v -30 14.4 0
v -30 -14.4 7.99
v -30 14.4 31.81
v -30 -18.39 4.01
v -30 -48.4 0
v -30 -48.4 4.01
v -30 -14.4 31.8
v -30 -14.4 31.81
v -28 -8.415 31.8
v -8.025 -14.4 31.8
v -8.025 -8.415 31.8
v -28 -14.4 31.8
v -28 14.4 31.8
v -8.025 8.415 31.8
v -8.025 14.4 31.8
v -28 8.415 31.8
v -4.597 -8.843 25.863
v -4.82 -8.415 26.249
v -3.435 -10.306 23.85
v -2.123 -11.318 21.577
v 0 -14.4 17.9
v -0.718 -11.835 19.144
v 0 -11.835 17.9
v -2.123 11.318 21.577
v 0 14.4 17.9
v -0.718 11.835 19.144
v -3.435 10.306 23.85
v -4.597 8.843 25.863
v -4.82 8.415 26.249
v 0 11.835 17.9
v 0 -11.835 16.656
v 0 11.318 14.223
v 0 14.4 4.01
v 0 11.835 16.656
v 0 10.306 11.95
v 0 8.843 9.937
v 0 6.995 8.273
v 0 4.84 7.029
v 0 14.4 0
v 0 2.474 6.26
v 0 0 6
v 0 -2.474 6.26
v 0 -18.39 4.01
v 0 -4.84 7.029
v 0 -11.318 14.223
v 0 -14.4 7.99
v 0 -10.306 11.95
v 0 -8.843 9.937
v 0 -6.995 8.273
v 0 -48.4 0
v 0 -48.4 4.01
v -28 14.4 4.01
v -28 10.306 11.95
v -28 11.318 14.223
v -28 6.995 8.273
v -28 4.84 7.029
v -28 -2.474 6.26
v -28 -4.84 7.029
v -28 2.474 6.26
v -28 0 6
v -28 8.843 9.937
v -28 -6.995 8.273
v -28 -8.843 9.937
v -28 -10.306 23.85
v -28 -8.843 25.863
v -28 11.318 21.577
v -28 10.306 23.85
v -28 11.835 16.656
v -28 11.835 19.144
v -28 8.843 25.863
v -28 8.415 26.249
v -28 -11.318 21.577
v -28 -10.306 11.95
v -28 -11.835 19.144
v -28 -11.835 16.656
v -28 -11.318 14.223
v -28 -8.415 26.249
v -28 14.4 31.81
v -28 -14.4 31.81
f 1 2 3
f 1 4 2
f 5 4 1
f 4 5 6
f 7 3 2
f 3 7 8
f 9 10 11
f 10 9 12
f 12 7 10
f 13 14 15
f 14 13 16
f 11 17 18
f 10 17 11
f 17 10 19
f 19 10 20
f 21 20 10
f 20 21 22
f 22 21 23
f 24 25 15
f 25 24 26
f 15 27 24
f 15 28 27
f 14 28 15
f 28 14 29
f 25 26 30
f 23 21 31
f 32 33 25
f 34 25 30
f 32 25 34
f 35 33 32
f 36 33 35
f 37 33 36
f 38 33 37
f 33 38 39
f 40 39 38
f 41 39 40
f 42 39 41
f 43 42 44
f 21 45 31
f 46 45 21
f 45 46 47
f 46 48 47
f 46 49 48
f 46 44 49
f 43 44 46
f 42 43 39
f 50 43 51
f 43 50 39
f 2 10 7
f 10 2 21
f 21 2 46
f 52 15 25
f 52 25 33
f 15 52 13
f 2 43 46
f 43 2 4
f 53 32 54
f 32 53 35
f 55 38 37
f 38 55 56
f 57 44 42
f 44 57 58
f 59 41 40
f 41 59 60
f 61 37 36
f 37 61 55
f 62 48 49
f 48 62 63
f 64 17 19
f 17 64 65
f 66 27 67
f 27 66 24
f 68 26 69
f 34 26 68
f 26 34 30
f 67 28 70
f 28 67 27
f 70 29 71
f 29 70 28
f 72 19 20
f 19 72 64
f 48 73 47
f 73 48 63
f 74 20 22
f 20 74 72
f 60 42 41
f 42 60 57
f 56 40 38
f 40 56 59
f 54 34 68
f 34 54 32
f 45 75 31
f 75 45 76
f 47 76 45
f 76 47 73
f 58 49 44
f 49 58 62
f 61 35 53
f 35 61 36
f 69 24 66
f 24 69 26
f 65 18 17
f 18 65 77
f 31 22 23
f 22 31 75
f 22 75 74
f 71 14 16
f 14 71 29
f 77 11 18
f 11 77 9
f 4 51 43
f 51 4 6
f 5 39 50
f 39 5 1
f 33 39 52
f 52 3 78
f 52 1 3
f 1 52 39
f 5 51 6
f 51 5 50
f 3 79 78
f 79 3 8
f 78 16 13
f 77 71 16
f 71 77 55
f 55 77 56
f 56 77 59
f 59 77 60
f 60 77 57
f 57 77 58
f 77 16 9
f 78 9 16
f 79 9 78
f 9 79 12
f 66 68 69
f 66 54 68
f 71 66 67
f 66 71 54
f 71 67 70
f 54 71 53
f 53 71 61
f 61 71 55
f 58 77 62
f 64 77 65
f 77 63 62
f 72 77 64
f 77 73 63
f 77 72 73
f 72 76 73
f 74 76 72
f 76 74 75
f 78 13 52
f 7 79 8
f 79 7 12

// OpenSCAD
baseThickness = 4;
length = 60;
kerf = 1.6;
tubingDiameter = 23.5;
clampingWidth = 30;
minWall = 2.5;
tubingTolerance = 0.15;
kerfTolerance = 0.1;
endAngle = 30;
stopWall = 2;
cornerSize = 4;
extraCutHeight = 2;
part = 2; // [0:miter,1:right end stop,2:left end stop]

module end_of_parameters_dummy() {}


//BEGIN: use <tubemesh.scad>;

//BEGIN: use <eval.scad>;
function _isString(v) = v >= "";
function _isVector(v) = !(v>="") && len(v) != undef;
function _isFloat(v) = v+0 != undef;

function _substr(s, start=0, stop=undef, soFar = "") =
    start >= (stop==undef ? len(s) : stop) ? soFar :
        _substr(s, start=start+1, stop=stop, soFar=str(soFar, s[start]));

function _parseInt(s, start=0, stop=undef, accumulated=0) =
    let( stop = stop==undef ? len(s) : stop )
        start >= stop ? accumulated :
        s[start] == "+" ? _parseInt(s, start=start+1, stop=stop) :
        s[start] == "-" ? -_parseInt(s, start=start+1, stop=stop) :
        let (digit = search(s[start], "0123456789"))
            digit == [] ? 0 : _parseInt(s, start=start+1, stop=stop, accumulated=accumulated*10+digit[0]);

function _findNonDigit(s, start=0) =
    start >= len(s) || s[start]<"0" || s[start]>"9" ? start :
    _findNonDigit(s, start=start+1);

function _replaceChar(s,c1,c2,pos=0,soFar="") =
    pos >= len(s) ? soFar :
    _replaceChar(s,c1,c2,pos=pos+1,soFar=str(soFar, s[pos]==c1 ? c2 : s[pos]));

function _parseUnsignedFloat(s) =
    len(s) == 0 ? 0 :
        let(
            firstNonDigit = _findNonDigit(s),
            decimalPart = s[firstNonDigit]!="." ?
                [firstNonDigit,firstNonDigit] : [firstNonDigit+1, _findNonDigit(s, start=firstNonDigit+1)],
            intPart = _parseInt(s,start=0,stop=firstNonDigit),
            fractionPart = _parseInt(s,start=decimalPart[0],stop=decimalPart[1]),
            baseExp = s[decimalPart[1]]=="e" || s[decimalPart[1]]=="E" ? pow(10,_parseInt(s, start=decimalPart[1]+1)) : 1)
            (intPart+fractionPart*pow(10,-(decimalPart[1]-decimalPart[0])))*baseExp;

function _tail(v) = len(v)>=2 ? [for(i=[1:len(v)-1]) v[i]] : [];
function _isspace(c) = (" " == c || "\t" == c || "\r" == c || "\n" == c );
function _isdigit(c) = ("0" <= c && c <= "9" );
function _isalpha(c) = ("a" <= c && c <= "z") || ("A" <= c && c <= "Z");
function _isalpha_(c) = _isalpha(c)  || c=="_";
function _isalnum_(c) = _isalpha(c) || _isdigit(c) || c=="_";
function _flattenLists(ll) = [for(a=ll) for(b=a) b];

function _spaceSequence(s, start=0, count=0) =
    len(s)>start && _isspace(s[start]) ? _spaceSequence(s, start=start+1, count=count+1) : count;
function _digitSequence(s, start=0, count=0) =
    len(s)>start && _isdigit(s[start]) ? _digitSequence(s, start=start+1,count=count+1) : count;
function _alnum_Sequence(s, start=0, count=0) =
    len(s)>start && _isalnum_(s[start]) ? _alnum_Sequence(s, start=start+1,count=count+1) : count;
function _identifierSequence(s, start=0, count=0) =
    len(s)>start && _isalpha_(s[start]) ? _alnum_Sequence(s, start=start+1, count=count+1) : count;
function _signedDigitSequence(s, start=0) =
    len(s) <= start ? 0 :
        (s[start] == "+" || s[start] == "-" ) ? 1+_digitSequence(s,start=start+1) : _digitSequence(s,start=start);
function _realStartingWithDecimal(s, start=0) =
    len(s)>start && s[start] == "." ?
        let(next = start+1+_digitSequence(s, start=start+1))
        (s[next] == "e" || s[next] == "E" ?
            next-start+1+_signedDigitSequence(s, start=next+1) : next-start)
        : 0;
function _realContinuation(s, start=0) =
    len(s) <= start ? 0 :
        let(c1=_realStartingWithDecimal(s, start=start))
        c1 > 0 ? c1 :
        s[start] == "e" || s[start] == "E" ?
            1+_signedDigitSequence(s, start=start+1) : 0;
function _positiveRealSequence(s, start=0) =
    len(s) <= start ? 0 :
        let(c1 = _realStartingWithDecimal(s, start=start))
            c1 > 0 ? c1 :
        let(c2 = _digitSequence(s, start=start))
            c2 > 0 ? c2 + _realContinuation(s, start=start+c2) : 0;

_multiSymbolOperators = [ "<=", ">=", "==", "&&", "||" ]; // must be in order of decreasing length

function _multiSymbolOperatorSequence(s, start=0) =
    (s[start]=="<" && s[start+1]=="=") ||
    (s[start]==">" && s[start+1]=="=") ||
    (s[start]=="=" && s[start+1]=="=") ||
    (s[start]=="!" && s[start+1]=="=") ||
    (s[start]=="&" && s[start+1]=="&") ||
    (s[start]=="|" && s[start+1]=="|") ? 2 : 0;

function _tokenize(s, start=0) =
    start >= len(s) ? [] :
    let(c1=_spaceSequence(s, start=start)) c1>0 ?
        concat([" "], _tokenize(s, start=start+c1)) :
    let(c2=_identifierSequence(s, start=start)) c2>0 ?
        concat([_substr(s, start=start, stop=start+c2)], _tokenize(s, start=start+c2)) :
    let(c3=_positiveRealSequence(s, start=start)) c3>0 ?
        concat([_substr(s, start=start, stop=start+c3)], _tokenize(s, start=start+c3)) :
    let(c4=_multiSymbolOperatorSequence(s, start=start)) c4>0 ?
        concat([_substr(s, start=start, stop=start+c4)], _tokenize(s, start=start+c4)) :
        concat([s[start]], _tokenize(s, start=start+1));


function _endParens(list,start=0,openCount=0,stop=undef) =
    let(stop = stop==undef ? len(list) : stop)
    start >= stop ? (openCount?undef:stop) :
    list[start][0] == ")" ?
            (openCount==1 ? start+1 : _endParens(list,start+1,stop=stop, openCount=openCount-1)) :
    _endParens(list,start+1,stop=stop, openCount=
        list[start][0] == "(" ?
            openCount+1 : openCount);

function _indexInTable(string, table, column=0) =
    let (s=search([string], table, index_col_num=column))
        s[0] == [] ? -1 : s[0][0];

_NAME = 0;
_ARITY = 1;
_PREC = 2;
_ASSOC_DIR = 3;
_ARGUMENTS_FROM_VECTOR = 4;
_OPERATOR = 5;
_EXTRA_DATA = 6;

function _func(op) = [ op, 1, -1, 1, true, op ];

_operators = [
    [ "[", 1, -1, 1, true, "[" ],
    [ "pow", 1, -1, 1, true, "^" ],
    [ "cross", 1, -1, 1, true, "cross" ],
    _func("sqrt"),
    _func("cos"),
    _func("sin"),
    _func("tan"),
    _func("acos"),
    _func("asin"),
    _func("atan"),
    _func("COS"),
    _func("SIN"),
    _func("TAN"),
    _func("ACOS"),
    _func("ASIN"),
    _func("ATAN"),
    _func("abs"),
    _func("ceil"),
    _func("exp"),
    _func("floor"),
    _func("ln"),
    _func("log"),
    _func("round"),
    _func("sign"),
    _func("norm"),
    [ "atan2", 1, -1, 1, true, "atan2" ],
    [ "ATAN2", 1, -1, 1, true, "ATAN2" ],
    [ "max", 1, -1, 1, true, "max" ],
    [ "min", 1, -1, 1, true, "min" ],
    [ "concat", 1, -1, 1, true, "concat" ],
    [ "#", 2, 0, -1, false, "#" ],
    [ "^", 2, 0, -1, false, "^" ],
    [ "#-",1, 0.5, 0, true, "-" ],
    [ "#+",1, 0.5, 0, true, "+" ],
    [ "*", 2, 1, 1, false, "*" ],
    [ "/", 2, 1, 1, false, "/" ],
    [ "%", 2, 1, 1, false, "%" ],
    [ "+", 2, 2, 1, true, "+" ],
    [ "-", 2, 2, 1, true, "-" ],
    [ "!=", 2, 3, 1, true, "!=" ],
    [ "==", 2, 3, 1, true, "==" ],
    [ "<=", 2, 3, 1, true, "<=" ],
    [ ">=", 2, 3, 1, true, ">=" ],
    [ "<", 2, 3, 1, true, "<" ],
    [ ">", 2, 3, 1, true, ">" ],
    [ "!", 1, 4, 1, true, "!" ],
    [ "&&", 2, 5, 1, true, "&&" ],
    [ "||", 2, 5, 1, true, "||" ],
    [ "?", 2, 10, -1, true, "?" ],
    [ ":", 2, 10, -1, true, ":" ],
    [ "=", 2, 30, 1, true, "=" ], // for let()
    [ "let", 1, 25, 1, true, "let" ],
    [ ",", 2, 100, 1, true, "," ]
   ];

_binary_or_unary = [ ["-", "#-"], ["+", "#+"], ["#", "["] ];

// insert parentheses in some places to tweak the order of
// operations in those contexts
function _fixBrackets(pretok,start=0) =
    start >= len(pretok) ? [] :
    pretok[start] == "[" ?
        concat(["#", "("], _fixBrackets(pretok,start=start+1)) :
    pretok[start] == "]" ?
        concat([")"], _fixBrackets(pretok,start=start+1)) :
    pretok[start] == "?" ?
        concat([pretok[start],"("], _fixBrackets(pretok,start=start+1)) :
    pretok[start] == ":" ?
        concat([")",pretok[start]], _fixBrackets(pretok,start=start+1)) :
        concat(pretok[start], _fixBrackets(pretok,start=start+1));

// disambiguate operators that can be unary or binary
function _fixUnaries(pretok) =
    [ for (i=[0:len(pretok)-1])
         let (
            a = pretok[i],
            j=_indexInTable(a, _binary_or_unary))
            (0 <= j && (i == 0 || pretok[i-1] == "(" ||
                0 <= _indexInTable(pretok[i-1], _operators)))? _binary_or_unary[j][1] : a ];

function _fixLet1(tok, start=0, stop=undef) =
    let (stop = stop==undef ? len(tok) : stop)
        start >= stop ? [] :
        tok[start][0] == "let"?
           let(endP=_endParens(tok,start=start+1,stop=stop,openCount=0)) concat([concat(tok[start], [_fixLet1(tok,start=start+2,stop=endP-1)])], _fixLet1(tok,start=endP,stop=stop)) :
        concat([tok[start]], _fixLet1(tok,start=start+1,stop=stop));

function _parsePass1(s) =
    let (pretok=_fixUnaries(_fixBrackets(_tokenize(s))))
    _fixLet1(
    [ for (i=[0:len(pretok)-1])
        let (a=pretok[i])
        if (a[0] != " ")
            let (j=_indexInTable(a, _operators))
                j >= 0 ? _operators[j] : [a] ] );

function _prec(op1, pos1, op2, pos2) =
    op1 != undef && op2 == undef ? false :
    op1 == undef && op2 != undef ? true :
    op1 == undef && op2 == undef ? true :
    op1[_ARITY] == 1 && pos1 > pos2 ? true :
    op2[_ARITY] == 1 && pos2 > pos1 ? false :
    op1[_PREC] < op2[_PREC] ? true :
        op2[_PREC] < op1[_PREC] ? false :
            op1[_ASSOC_DIR] * pos1 < op2[_ASSOC_DIR] * pos2;

function _parseLiteralOrVariable(s) =
        s == "PI" ? PI :
        s == "true" ? true :
        s == "false" ? false :
        s == "undef" ? undef :
        _isalpha_(s[0]) ? s :
        _parseUnsignedFloat(s);

function _isoperator(token) = _PREC<len(token);

function _getCandidatesForMainOperator(tok,start,stop) =
   start >= stop ? [] :
   tok[start][0] == "(" ?
        _getCandidatesForMainOperator(tok,_endParens(tok,start=start+1,stop=stop,openCount=1),stop)
        :
        _isoperator(tok[start]) ? concat([[tok[start],start]],_getCandidatesForMainOperator(tok,start+1,stop)) :
        _getCandidatesForMainOperator(tok,start+1,stop);

// Find the operator with least precedence
function _findMainOperatorPos(candidates,start=0) =
    len(candidates) <= start ? undef :
    let(rest=_findMainOperatorPos(candidates,start+1))
    _prec(candidates[rest][0], rest, candidates[start][0], start) ? start : rest;

function _firstOccurrence(c,opName,start=0) =
    start >= len(c) ? undef :
    c[start][0][0] == opName ? c[start] :
        _firstOccurrence(c,opName,start=start+1);

// We know the main operator is a ? or a :. We now need to find out which.
function _mainQuestionOperator(c) =
    let(fq = _firstOccurrence(c,"?"),
        fc = _firstOccurrence(c,":"))
        fq[1] != undef && (fc[1] == undef || fq[1] < fc[1]) ? fq : fc;

function _mainOperator(tok,start,stop) =
    let(c=_getCandidatesForMainOperator(tok,start,stop),
        pos=_findMainOperatorPos(c),
        m=c[pos])
        m[0][0] == "?" ?
            concat(m, [_firstOccurrence(c,":",start=pos+1)[1]])
            : m;

function _doLets(assignments, final, start=0) =
    start >= len(assignments) ? final :
    assignments[start][0] == "=" ? ["let", ["'", assignments[start][1]], assignments[start][2], _doLets(assignments, final, start=start+1)] : _doLets(assignments, final, start=start+1);

function _letOperator(a,b) =
    let(rawAssignments=_fixCommas(a),
        assignments=rawAssignments[0] == "[[" ?
            _tail(rawAssignments) : [a])
    _doLets(assignments, b);

/* This takes a fully tokenized vector, each element of which is either a line from the _operators table or a vector containing a single non-operator string, and parses it using general parenthesis and operator parsing. Comma expressions for building vectors will be parsed in the next pass. */
function _parseMain(tok,start=0,stop=undef) =
    let( stop= stop==undef ? len(tok) : stop )
        stop <= start ? undef :
        tok[start][0] == "(" && _endParens(tok,start=start+1,stop=stop,openCount=1)==stop ?
            _parseMain(tok,start=start+1,stop=stop-1) :
        let( lp = _mainOperator(tok,start,stop) )
            lp[0] == undef ? ( stop-start>1 ? undef : _parseLiteralOrVariable(tok[start][0]) ) :
            let( op = lp[0], pos = lp[1] )
                op[_NAME] == "?" ?
                    [ op[_OPERATOR], _parseMain(tok,start=start,stop=pos), _parseMain(tok,start=pos+1,stop=lp[2]), _parseMain(tok,start=lp[2]+1,stop=stop) ] :
                op[_NAME] == "let" ?
                    _letOperator( _parseMain(op[_EXTRA_DATA]), _parseMain(tok,start=pos+1,stop=stop)) :
                op[_ARITY] == 2 ?
                    (start==pos ?
                    /* unary */

                    let(j=_indexInTable(op[_OPERATOR], _binary_or_unary)) [ _binary_or_unary[j][1],_parseMain(tok,start=pos+1,stop=stop)] : [ op[_OPERATOR], _parseMain(tok,start=start,stop=pos), _parseMain(tok,start=pos+1,stop=stop)])
                    : [ op[_OPERATOR], _parseMain(tok,start=pos+1,stop=stop) ];


// this upgrades sequences of binary commas to vectors
function _fixCommas(expression) =
    expression[0] == "," ?
        let(a=_fixCommas(expression[1]),
            b=_fixCommas(expression[2]))
            a[0] == "[[" ?
                concat(["[["],concat(_tail(a), [b])) :
                ["[[",a,b]
        :
    _isVector(expression) ?
            concat([expression[0]], [for (i=[1:len(expression)-1]) _fixCommas(expression[i])]) :
            expression;

// fix arguments from vectors
function _fixArguments(expression) =
    let(i=_indexInTable(expression[0], _operators, _OPERATOR))
            i >=0 && _operators[i][_ARGUMENTS_FROM_VECTOR] && expression[1][0] == "[[" ? concat([expression[0]], [for (i=[1:len(expression[1])-1]) _fixArguments(expression[1][i])]) :
/*            expression[0] == "?" ?
                concat([expression[0],expression[1]],[for (i=[1:len(expression[2])-1]) _fixArguments(expression[2][i])]) : */
            len(expression)>1 && !_isString(expression) ?
                concat([expression[0]], [for (i=[1:len(expression)-1]) _fixArguments(expression[i])])
                    : expression;

function _optimizedLiteral(x) =
    len(x)==undef ? x : ["'", x];

function _wellDefined(x) =
    x==undef ? false :
    len(x)==undef ? true :
    x[0] == "'" ? true :
    len(x)==1 ? x[0]!=undef :
    len([for (a=x) if(!_wellDefined(a)) true])==0;

function _optimize(expression) =
    let(x=eval(expression,$careful=true))
        _wellDefined(x) ? _optimizedLiteral(x) :
        expression[0] == "'" ? _optimizedLiteral(x) :
        ! _isString(expression) ?
            concat([expression[0]], [for(i=[1:len(expression)-1]) (i>1 || expression[0] != "let") ?  _optimize(expression[i]) : expression[i]]) :
        expression;

function compileFunction(expression,optimize=true) =
            _isVector(expression) ? expression :
            _isFloat(expression) ? expression :
            let(unoptimized = _fixArguments(_fixCommas(_parseMain(_parsePass1(expression)))))
        optimize ? _optimize(unoptimized) : unoptimized;

function evaluateFunction(expression,variables) = eval(compileFunction(expression,optimize=false),variables);

function _let(v, var, value) = concat([var, value], v);

function _lookupVariable(var, table) =
    let (s=search([var], table, index_col_num=0))
        s[0] == [] ? undef : table[s[0][0]][1];

function _generate(var, range, expr, v) =
    [ for(i=range) eval(expr, _let(v, var, i)) ];

function _safeNorm(v) =
    ! _isVector(v) || len([for (x=v) x+0==undef]) ? undef : norm(v);

function eval(c,v=[]) =
    ""<=c ? _lookupVariable(c,v) :
    let(op=c[0]) (
    op == undef ? c :
    op == "'" ? c[1] :
    op == "+" ? (len(c)==2 ? eval(c[1],v) : eval(c[1],v)+eval(c[2],v)) :
    op == "-" ? (len(c)==2 ? -eval(c[1],v) : eval(c[1],v)-eval(c[2],v)) :
    op == "*" ? eval(c[1],v)*eval(c[2],v) :
    op == "/" ? eval(c[1],v)/eval(c[2],v) :
    op == "%" ? eval(c[1],v)%eval(c[2],v) :
    op == "sqrt" ? sqrt(eval(c[1],v)) :
    op == "^" || op == "pow" ? pow(eval(c[1],v),eval(c[2],v)) :
    op == "cos" ? cos(eval(c[1],v)) :
    op == "sin" ? sin(eval(c[1],v)) :
    op == "tan" ? tan(eval(c[1],v)) :
    op == "acos" ? acos(eval(c[1],v)) :
    op == "asin" ? asin(eval(c[1],v)) :
    op == "atan" ? atan(eval(c[1],v)) :
    op == "atan2" ? atan2(eval(c[1],v),eval(c[2],v)) :
    op == "COS" ? cos(eval(c[1],v)*180/PI) :
    op == "SIN" ? sin(eval(c[1],v)*180/PI) :
    op == "TAN" ? tan(eval(c[1],v)*180/PI) :
    op == "ACOS" ? acos(eval(c[1],v))*PI/180 :
    op == "ASIN" ? asin(eval(c[1],v))*PI/180 :
    op == "ATAN" ? atan(eval(c[1],v))*PI/180 :
    op == "ATAN2" ? atan2(eval(c[1],v),eval(c[2],v))*PI/180 :
    op == "abs" ? abs(eval(c[1],v)) :
    op == "ceil" ? ceil(eval(c[1],v)) :
    op == "cross" ? cross(eval(c[1],v),eval(c[2],v)) :
    op == "exp" ? exp(eval(c[1],v)) :
    op == "floor" ? floor(eval(c[1],v)) :
    op == "ln" ? ln(eval(c[1],v)) :
    op == "len" ? len(eval(c[1],v)) :
    op == "log" ? log(eval(c[1],v)) :
    op == "max" ? (len(c) == 2 ? max(eval(c[1],v)) : max([for(i=[1:len(c)-1]) eval(c[i],v)])) :
    op == "min" ? (len(c) == 2 ? min(eval(c[1],v)) : min([for(i=[1:len(c)-1]) eval(c[i],v)])) :
    op == "norm" ?
        (!$careful ? norm(eval(c[1],v)) : _safeNorm(eval(c[1],v))) :
    op == "rands" ? rands(eval(c[1],v),eval(c[2],v),eval(c[3],v),eval(c[4],v)) :
    op == "round" ? round(eval(c[1],v)) :
    op == "sign" ? sign(eval(c[1],v)) :
    op == "[" ? [for (i=[1:len(c)-1]) eval(c[i],v)] :
    op == "#" ? eval(c[1],v)[eval(c[2],v)] :
    op == "<" ? eval(c[1],v)<eval(c[2],v) :
    op == "<=" ? eval(c[1],v)<=eval(c[2],v) :
    op == ">=" ? eval(c[1],v)>=eval(c[2],v) :
    op == ">" ? eval(c[1],v)>=eval(c[2],v) :
    op == "==" ? (!$careful ? eval(c[1],v)==eval(c[2],v) :
        (let(c1=eval(c[1],v))
        c1==undef ? undef :
        let(c2=eval(c[2],v))
        c2==undef ? undef :
        c1 == c2) ) :
    op == "!=" ? (!$careful ? eval(c[1],v)!=eval(c[2],v) :
        (let(c1=eval(c[1],v))
        c1==undef ? undef :
        let(c2=eval(c[2],v))
        c2==undef ? undef :
        c1 != c2) ) :
    op == "&&" ? (!$careful ? eval(c[1],v)&&eval(c[2],v) :
        (let(c1=eval(c[1],v))
        c1==undef ? undef :
        !c1 ? false :
        let(c2=eval(c[2],v))
        c2==undef ? undef :
        c1 && c2) ) :
    op == "||" ? (!$careful ? eval(c[1],v)||eval(c[2],v) :
        (let(c1=eval(c[1],v))
        c1==undef ? undef :
        c1 ? true :
        let(c2=eval(c[2],v))
        c2==undef ? undef :
        c1 || c2) ) :
    op == "!" ? (!$careful ? !eval(c[1],v) :
        (let(c1=eval(c[1],v))
        c1==undef ? undef :
        !c1) ) :
    op == "?" ? (!$careful ? (eval(c[1],v)?eval(c[2],v):eval(c[3],v)) :
        (let(c1=eval(c[1],v))
        c1==undef ? undef :
        c1 ? eval(c[2],v):eval(c[3],v)) ):

    op == "concat" ? [for (i=[1:len(c)-1]) let(vect=eval(c[i],v)) for(j=[0:len(vect)-1]) vect[j]] :
    op == "range" ? (len(c)==3 ? [eval(c[1],v):eval(c[2],v)] : [eval(c[1],v):eval(c[2],v):eval(c[3],v)]) :
    op == "let" ? (!$careful ? eval(c[3],concat([[eval(c[1],v),eval(c[2],v)]], v)) :
            let(c1=eval(c[1],v),c2=eval(c[2],v))
                c1==undef || c2==undef ? undef :
                    eval(c[3],concat([[c1,c2]], v)) ) :
    op == "gen" ? _generate(eval(c[1],v),eval(c[2],v),c[3],v) :
    undef
    );

// per 10,000 operations with "x^3*y-x*y^3"
// 24 sec compile
// 21 sec unoptimized compile
// 22 sec evaluateFunction()
// 0.7 sec eval

// pass1 10 seconds [tokenize: 4 seconds]
// parseMain 6
// fixCommas 0
// fixArguments 3
// optimize 3
/*
echo(compileFunction("x^(2*3)"));
fc = compileFunction("x^3*y-x*y^3",optimize=true);
echo(fc);
echo(eval(fc,[["x",1],["y",1]]));
z=[for(i=[0:9999]) compileFunction("x^3*y-x*y^3",optimize=false)];//fc,[ ["x",1],["y",2] ])];
*/

//z = [for(i=[1:10000]) compileFunction("x^3*y-x*y^3")];
// normal: 23

//function repeat(s, copies, soFar="") = copies <= 0 ? soFar : repeat(s, copies-1, soFar=str(soFar,s));

//END: use <eval.scad>;


// params = [sections,sectionCounts]

// written for tail-recursion
// _subtotals[i] = list[0] + ... + list[i-1]
function _subtotals(list,soFar=[]) =
        len(soFar) >= 1+len(list) ? soFar :
        _subtotals(list,
            let(n1=len(soFar))
            concat(soFar, n1>0 ? soFar[n1-1]+list[n1-1] : 0));

function _flatten(list) = [for (a=list) for(b=a) b];

function _reverseTriangle(t) = [t[2], t[1], t[0]];

// smallest angle in triangle
function _minAngle(p1,p2,p3) =
    let(a = p2-p1,
        b = p3-p1,
        c = p3-p2,
        v1 = a*b,
        v2 = -(c*a))
        v1 == 0 || v2 == 0 ? 0 :
        let( na = norm(a),
             a1 = acos(v1 / (na*norm(b))),
             a2 = acos(v2 / (na*norm(c))) )
        min(a1,a2,180-(a1+a2));

// triangulate square to maximize smallest angle
function _doSquare(points,i11,i21,i22,i12,optimize=true) =
    points[i11]==points[i12] ? [[i11,i21,i22]] :
    points[i21]==points[i22] ? [[i22,i12,i11]] :
    !optimize ? [[i11,i21,i22], [i22,i12,i11]] :
    let (m1 = min(_minAngle(points[i11],points[i21],points[i22]), _minAngle(points[i22],points[i12],points[i11])),
        m2 = min(_minAngle(points[i11],points[i21],points[i12]),
                _minAngle(points[i21],points[i22],points[i12])) )
        m2 <= m1 ? [[i11,i21,i22], [i22,i12,i11]] :
                  [[i11,i21,i12], [i21,i22,i12]];

/*
function _inTriangle(v1,t) = (v1==t[0] || v1==t[1] || v1==t[2]);

function _findTheDistinctVertex(t1,t2) =
    let(in = [for(i=[0:2]) _inTriangle(t1[i],t2)])
    ! in[0] && in[1] && in[2] ? 0 :
    ! in[1] && in[0] && in[2] ? 1 :
    ! in[2] && in[0] && in[1] ? 2 :
    undef;

// make vertex i come first
function _rotateTriangle(t,i) =
    [for (j=[0:2]) t[(j+i)%3]];

function _optimize2Triangles(points,t1,t2) =
    let(i1 = _findTheDistinctVertex(t1,t2))
    i1 == undef ? [t1,t2] :
    let(i2 = _findTheDistinctVertex(t2,t1))
    i2 == undef ? [t1,t2] :
    let(t1 = _rotateTriangle(t1,i1),
        t2 = _rotateTriangle(t2,i2))
    _doSquare(points,t1[1],t2[0],t2[1],t1[0],optimize=true);

// a greedy optimization for a strip of triangles most of which adjoin one another; written for tail-recursion
function _optimizeTriangles(points,triangles,position=0,optimize=true,iterations=4) =
        !optimize || position >= iterations*len(triangles) ? triangles :
            _optimizeTriangles(points,
                let(
                    n = len(triangles),
                    position1=position%n,
                    position2=(position+1)%n,
                    opt=_optimize2Triangles(points,triangles[position1],triangles[position2]))
                    [for (i=[0:len(triangles)-1])
                        i == position1 ? opt[0] :
                        i == position2 ? opt[1] :
                            triangles[i]],
                position=position+1);
*/

function _removeEmptyTriangles(points,triangles) =
    [for(t=triangles)
        if(true || points[t[0]] != points[t[1]] && points[t[1]] != points[t[2]] && points[t[2]] != points[t[0]]) t];

// n1 and n2 should be fairly small, so this doesn't need
// tail-recursion
// this assumes n1<=n2
function _tubeSegmentTriangles(points,index1,n1,index2,n2,i=0,soFar=[],optimize=true)
    = i>=n2 ? _removeEmptyTriangles(points,soFar) :
            let(i21=i,
                i22=(i+1)%n2,
                i11=floor((i21)*n1/n2+0.5)%n1,
                i12=floor((i22)*n1/n2+0.5)%n1,
                add = i11==i12 ? [[index1+i11,index2+i21,index2+i22]] :
                    _doSquare(points,index1+i11,index2+i21,index2+i22,index1+i12,optimize=optimize))
                _tubeSegmentTriangles(points,index1,n1,index2,n2,i=i+1,soFar=concat(soFar,add),optimize=optimize);

function _tubeSegmentFaces(points,index,n1,n2,optimize=true)
    = n1<n2 ? _tubeSegmentTriangles(points,index,n1,index+n1,n2,optimize=optimize) :
        [for (f=_tubeSegmentTriangles(points,index+n1,n2,index,n1,optimize=optimize)) _reverseTriangle(f)];

function _tubeMiddleFaces(points,counts,subtotals,optimize=true) = [ for (i=[1:len(counts)-1])
           for (face=_tubeSegmentFaces(points,subtotals[i-1],counts[i-1],counts[i],optimize=optimize)) face ];

function _endCaps(counts,subtotals,startCap=true,endCap=true) =
    let( n = len(counts),
         cap1 = counts[0]<=2 || !startCap ? undef : [for(i=[0:counts[0]-1]) i],
         cap2 = counts[n-1]<=2 || !endCap ? undef : [for(i=[counts[n-1]-1:-1:0]) subtotals[n-1]+i] )
       [for (c=[cap1,cap2]) if (c!=undef) c];

function _tubeFaces(sections,startCap=true,endCap=true,optimize=true) =
                let(
        counts = [for (s=sections) len(s)],
        points = _flatten(sections),
        subtotals = _subtotals(counts))
            concat(_tubeMiddleFaces(points,counts,subtotals,optimize=optimize),_endCaps(counts,subtotals,startCap=true,endCap=true));

function _removeDuplicates1(points,soFar=[[],[]]) =
        len(soFar[0]) >= len(points) ? soFar :
            _removeDuplicates1(points,
               let(
                mapSoFar=soFar[0],
                pointsSoFar=soFar[1],
                j=len(mapSoFar),
                k=search([points[j]], pointsSoFar)[0])
                k == []? [concat(mapSoFar,[len(pointsSoFar)]),
                            concat(pointsSoFar,[points[j]])] :
                           [concat(mapSoFar,[k]),pointsSoFar]);

function _removeDuplicates(points, faces) =
    let(fix=_removeDuplicates1(points),
        map=fix[0],
        newPoints=fix[1],
        newFaces=[for(f=faces) [for(v=f) map[v]]])
            [newPoints, newFaces];

function pointsAndFaces(sections,startCap=true,endCap=true,optimize=true) =
        let(
            points0=_flatten(sections),
            faces0=_tubeFaces(sections,startCap=startCap,endCap=endCap,optimize=optimize))
        _removeDuplicates(points0,faces0);

function sectionZ(section,z) = [for(xy=section) [xy[0],xy[1],z]];
function sectionX(section,x) = [for(yz=section) [x,yz[0],yz[1]]];
function sectionY(section,y) = [for(xz=section) [xz[0],y,xz[1]]];


function shiftSection(section,delta) = [for(p=section) [for(i=[0:len(delta)-1]) (p[i]==undef?0:p[i])+delta[i]]];

module tubeMesh(sections,startCap=true,endCap=true,optimize=true) {
    pAndF = pointsAndFaces(sections,startCap=startCap,endCap=endCap,optimize=optimize);
    polyhedron(points=pAndF[0],faces=pAndF[1]);
}

// increase number of points from len(section) to n
function _interpolateSection(section,n) =
        let(m=len(section))
        n == m ? section :
        n < m ? undef :
            [for(i=[0:m-1])
                let(cur=floor(i*n/m),
                    k=floor((i+1)*n/m)-cur,
                    i2=(i+1)%m)
                    for(j=[0:k-1])
                        let(t=j/k)
                            section[i]*(1-t)+section[i2]*t];

function arcPoints(r=10,d=undef,start=0,end=180,z=undef) =
            let(r=d==undef?r:d/2,
                n=getPointsAround(abs(end-start)))
                    r*[for(i=[0:n])
                        let(angle=start+i*(end-start)/n) [cos(angle),sin(angle)]];

function ngonPoints(n=4,r=10,d=undef,rotate=0,z=undef) =
            let(r=d==undef?r:d/2)
            z==undef ?
            r*[for(i=[0:n-1]) let(angle=i*360/n+rotate) [cos(angle),sin(angle)]] :
            [for(i=[0:n-1]) let(angle=i*360/n+rotate) [r*cos(angle),r*sin(angle),z]];

function starPoints(n=10,r1=5,r2=10,rotate=0,z=undef) =
          z==undef ?
            [for(i=[0:2*n-1]) let(angle=i*180/n+rotate) (i%2?r1:r2) * [cos(angle),sin(angle)]] :
            [for(i=[0:2*n-1]) let(angle=i*180/n+rotate, r=i%2?r1:r2) [r*cos(angle),r*sin(angle),z]];

function roundedSquarePoints(size=[10,10],radius=2,z=undef) =
    let(n=$fn?$fn:32,
        x=len(size)>=2 ? size[0] : size,
        y=len(size)>=2 ? size[1] : size,
        centers=[[x-radius,y-radius],[radius,y-radius],[radius,radius],[x-radius,radius]],
        section=[for(i=[0:n-1])
            let(center=centers[floor(i*4/n)],
                angle=360*i/n)
            center+radius*[cos(angle),sin(angle)]])
        z==undef ? section : sectionZ(section,z);

function getPointsAround(radius, angle=360) =
    max(3, $fn ? ceil($fn*angle/360) :
        max(floor(0.5+angle/$fa), floor(0.5+2*radius*PI*angle/360/$fs)));

// warning: no guarantee of perfect convexity
module mySphere(r=10,d=undef) {
    GA = 2.39996322972865332 * 180 / PI;
    radius = d==undef ? r : d/2;
    pointsAround = getPointsAround(radius);
    numSlices0 = (pointsAround + pointsAround % 2)/2;
    numSlices = numSlices0 + (numSlices0%2);
    sections = radius*[for(i=[0:numSlices])
                    i == 0 ? [[0,0,-1]] :
                    i == numSlices ? [[0,0,1]] :
                    let(
                        lat = (i-numSlices/2)/(numSlices/2)*90,
                        z1 = sin(lat),
                        r1 = cos(lat),
                        count = max(3,floor(0.5 + pointsAround * abs(r1))))
                        ngonPoints(count,r=r1,z=z1)];
    data = pointsAndFaces(sections,optimize=false);
    polyhedron(points=data[0], faces=data[1]);
}

function twistSectionXY(section,theta) =
    [for (p=section) [for(i=[0:len(p)-1])
        i == 0 ? p[0]*cos(theta)-p[1]*sin(theta) :
        i == 1 ? p[0]*sin(theta)+p[1]*cos(theta) :
        p[i]]];

module morphExtrude(section1,section2,height=undef,twist=0,numSlices=10,curve="t",curveParams=[[]],startCap=true,endCap=true,optimize=false) {

    fc = compileFunction(curve);
    n = max(len(section1),len(section2));

    section1interp = _interpolateSection(section1,n);
    section2interp = _interpolateSection(section2,n);
    sections = height == undef ?
                      [for(i=[0:numSlices])
                        let(t=i/numSlices)
                        (1-t)*section1interp+t*section2interp] :
                      [for(i=[0:numSlices])
                        let(t=i/numSlices,
                            t1=eval(fc,concat([["t",t]],curveParams)),
                            theta = t*twist,
                            section=(1-t1)*section1interp+t1*section2interp)
                        twistSectionXY(sectionZ(section,height*t),theta)];

    tubeMesh(sections,startCap=startCap,endCap=endCap,optimize=false);
}

module cone(r=10,d=undef,height=10) {
    radius = d==undef ? r : d/2;
    pointsAround =
        $fn ? $fn :
        max(3, floor(0.5+360/$fa), floor(0.5+2*radius*PI/$fs));
    morphExtrude(ngonPoints(n=pointsAround,r=radius), [[0,0]], height=height,optimize=false);
}

module prism(base=[[0,0,0],[1,0,0],[0,1,0]], vertical=[0,0,1]) {
    morphExtrude(base,[for(v=base) v+vertical],numSlices=1);
}


//END: use <tubemesh.scad>;



module dummy() {}

nudge = 0.01;
length1 = part==0 ? length : length/2;
kerf1 = kerf+kerfTolerance;
tubingDiameter1 = tubingDiameter + 2 * tubingTolerance;
tubingMax = tubingDiameter1 + 2*minWall;
clampingWidth1 = clampingWidth + cornerSize;
tubeCutHeight = tubingDiameter1 + extraCutHeight;
module solid() {
    cornerTri = [[nudge,0],[-cornerSize,0],[nudge,cornerSize]];
    sideProfile = [[0,0],[length1,0],[length1,extraCutHeight+tubingDiameter1/2],[length1-((part==0)?(tubeCutHeight-tubingDiameter1/2)*tan(endAngle):0),extraCutHeight+tubeCutHeight],[(tubeCutHeight-tubingDiameter1/2)*tan(endAngle),extraCutHeight+tubeCutHeight],[0,extraCutHeight+tubingDiameter1/2]];

    translate([0,-clampingWidth1-tubingMax/2,0]) cube([length1,tubingMax+clampingWidth1,baseThickness+nudge]);
    translate([0,-tubingMax/2,baseThickness])
    difference() {
        union() {
            tubeMesh([sectionY(sideProfile,0),sectionY(sideProfile,tubingMax)]);
            tubeMesh([sectionX(cornerTri,0),sectionX(cornerTri,length1)]);
        }
        translate([-nudge,tubingMax/2,tubingDiameter1/2+extraCutHeight]) rotate([0,90,0]) cylinder(d=tubingDiameter1,h=length1+2*nudge);
        translate([-nudge,tubingMax/2-tubingDiameter1*cos(45)/2,tubingDiameter1/2]) cube([length1+2*nudge,tubingDiameter1*cos(45),tubeCutHeight]);

    }
}

render(convexity=2)
if (part==0) {
    difference() {
        solid();
        translate([length1/2-kerf1/2,-tubingMax/2-cornerSize ,baseThickness]) cube([kerf1,tubingMax+cornerSize+nudge,extraCutHeight+tubingMax+nudge]);
    }
}
else if (part==1 || part==2) {
    mirror([part==2?1:0,0,0]) {
        solid();
        translate([length1-stopWall,-tubingMax/2,0]) cube([stopWall,tubingMax,extraCutHeight+tubeCutHeight+baseThickness+nudge]);
    }
}
